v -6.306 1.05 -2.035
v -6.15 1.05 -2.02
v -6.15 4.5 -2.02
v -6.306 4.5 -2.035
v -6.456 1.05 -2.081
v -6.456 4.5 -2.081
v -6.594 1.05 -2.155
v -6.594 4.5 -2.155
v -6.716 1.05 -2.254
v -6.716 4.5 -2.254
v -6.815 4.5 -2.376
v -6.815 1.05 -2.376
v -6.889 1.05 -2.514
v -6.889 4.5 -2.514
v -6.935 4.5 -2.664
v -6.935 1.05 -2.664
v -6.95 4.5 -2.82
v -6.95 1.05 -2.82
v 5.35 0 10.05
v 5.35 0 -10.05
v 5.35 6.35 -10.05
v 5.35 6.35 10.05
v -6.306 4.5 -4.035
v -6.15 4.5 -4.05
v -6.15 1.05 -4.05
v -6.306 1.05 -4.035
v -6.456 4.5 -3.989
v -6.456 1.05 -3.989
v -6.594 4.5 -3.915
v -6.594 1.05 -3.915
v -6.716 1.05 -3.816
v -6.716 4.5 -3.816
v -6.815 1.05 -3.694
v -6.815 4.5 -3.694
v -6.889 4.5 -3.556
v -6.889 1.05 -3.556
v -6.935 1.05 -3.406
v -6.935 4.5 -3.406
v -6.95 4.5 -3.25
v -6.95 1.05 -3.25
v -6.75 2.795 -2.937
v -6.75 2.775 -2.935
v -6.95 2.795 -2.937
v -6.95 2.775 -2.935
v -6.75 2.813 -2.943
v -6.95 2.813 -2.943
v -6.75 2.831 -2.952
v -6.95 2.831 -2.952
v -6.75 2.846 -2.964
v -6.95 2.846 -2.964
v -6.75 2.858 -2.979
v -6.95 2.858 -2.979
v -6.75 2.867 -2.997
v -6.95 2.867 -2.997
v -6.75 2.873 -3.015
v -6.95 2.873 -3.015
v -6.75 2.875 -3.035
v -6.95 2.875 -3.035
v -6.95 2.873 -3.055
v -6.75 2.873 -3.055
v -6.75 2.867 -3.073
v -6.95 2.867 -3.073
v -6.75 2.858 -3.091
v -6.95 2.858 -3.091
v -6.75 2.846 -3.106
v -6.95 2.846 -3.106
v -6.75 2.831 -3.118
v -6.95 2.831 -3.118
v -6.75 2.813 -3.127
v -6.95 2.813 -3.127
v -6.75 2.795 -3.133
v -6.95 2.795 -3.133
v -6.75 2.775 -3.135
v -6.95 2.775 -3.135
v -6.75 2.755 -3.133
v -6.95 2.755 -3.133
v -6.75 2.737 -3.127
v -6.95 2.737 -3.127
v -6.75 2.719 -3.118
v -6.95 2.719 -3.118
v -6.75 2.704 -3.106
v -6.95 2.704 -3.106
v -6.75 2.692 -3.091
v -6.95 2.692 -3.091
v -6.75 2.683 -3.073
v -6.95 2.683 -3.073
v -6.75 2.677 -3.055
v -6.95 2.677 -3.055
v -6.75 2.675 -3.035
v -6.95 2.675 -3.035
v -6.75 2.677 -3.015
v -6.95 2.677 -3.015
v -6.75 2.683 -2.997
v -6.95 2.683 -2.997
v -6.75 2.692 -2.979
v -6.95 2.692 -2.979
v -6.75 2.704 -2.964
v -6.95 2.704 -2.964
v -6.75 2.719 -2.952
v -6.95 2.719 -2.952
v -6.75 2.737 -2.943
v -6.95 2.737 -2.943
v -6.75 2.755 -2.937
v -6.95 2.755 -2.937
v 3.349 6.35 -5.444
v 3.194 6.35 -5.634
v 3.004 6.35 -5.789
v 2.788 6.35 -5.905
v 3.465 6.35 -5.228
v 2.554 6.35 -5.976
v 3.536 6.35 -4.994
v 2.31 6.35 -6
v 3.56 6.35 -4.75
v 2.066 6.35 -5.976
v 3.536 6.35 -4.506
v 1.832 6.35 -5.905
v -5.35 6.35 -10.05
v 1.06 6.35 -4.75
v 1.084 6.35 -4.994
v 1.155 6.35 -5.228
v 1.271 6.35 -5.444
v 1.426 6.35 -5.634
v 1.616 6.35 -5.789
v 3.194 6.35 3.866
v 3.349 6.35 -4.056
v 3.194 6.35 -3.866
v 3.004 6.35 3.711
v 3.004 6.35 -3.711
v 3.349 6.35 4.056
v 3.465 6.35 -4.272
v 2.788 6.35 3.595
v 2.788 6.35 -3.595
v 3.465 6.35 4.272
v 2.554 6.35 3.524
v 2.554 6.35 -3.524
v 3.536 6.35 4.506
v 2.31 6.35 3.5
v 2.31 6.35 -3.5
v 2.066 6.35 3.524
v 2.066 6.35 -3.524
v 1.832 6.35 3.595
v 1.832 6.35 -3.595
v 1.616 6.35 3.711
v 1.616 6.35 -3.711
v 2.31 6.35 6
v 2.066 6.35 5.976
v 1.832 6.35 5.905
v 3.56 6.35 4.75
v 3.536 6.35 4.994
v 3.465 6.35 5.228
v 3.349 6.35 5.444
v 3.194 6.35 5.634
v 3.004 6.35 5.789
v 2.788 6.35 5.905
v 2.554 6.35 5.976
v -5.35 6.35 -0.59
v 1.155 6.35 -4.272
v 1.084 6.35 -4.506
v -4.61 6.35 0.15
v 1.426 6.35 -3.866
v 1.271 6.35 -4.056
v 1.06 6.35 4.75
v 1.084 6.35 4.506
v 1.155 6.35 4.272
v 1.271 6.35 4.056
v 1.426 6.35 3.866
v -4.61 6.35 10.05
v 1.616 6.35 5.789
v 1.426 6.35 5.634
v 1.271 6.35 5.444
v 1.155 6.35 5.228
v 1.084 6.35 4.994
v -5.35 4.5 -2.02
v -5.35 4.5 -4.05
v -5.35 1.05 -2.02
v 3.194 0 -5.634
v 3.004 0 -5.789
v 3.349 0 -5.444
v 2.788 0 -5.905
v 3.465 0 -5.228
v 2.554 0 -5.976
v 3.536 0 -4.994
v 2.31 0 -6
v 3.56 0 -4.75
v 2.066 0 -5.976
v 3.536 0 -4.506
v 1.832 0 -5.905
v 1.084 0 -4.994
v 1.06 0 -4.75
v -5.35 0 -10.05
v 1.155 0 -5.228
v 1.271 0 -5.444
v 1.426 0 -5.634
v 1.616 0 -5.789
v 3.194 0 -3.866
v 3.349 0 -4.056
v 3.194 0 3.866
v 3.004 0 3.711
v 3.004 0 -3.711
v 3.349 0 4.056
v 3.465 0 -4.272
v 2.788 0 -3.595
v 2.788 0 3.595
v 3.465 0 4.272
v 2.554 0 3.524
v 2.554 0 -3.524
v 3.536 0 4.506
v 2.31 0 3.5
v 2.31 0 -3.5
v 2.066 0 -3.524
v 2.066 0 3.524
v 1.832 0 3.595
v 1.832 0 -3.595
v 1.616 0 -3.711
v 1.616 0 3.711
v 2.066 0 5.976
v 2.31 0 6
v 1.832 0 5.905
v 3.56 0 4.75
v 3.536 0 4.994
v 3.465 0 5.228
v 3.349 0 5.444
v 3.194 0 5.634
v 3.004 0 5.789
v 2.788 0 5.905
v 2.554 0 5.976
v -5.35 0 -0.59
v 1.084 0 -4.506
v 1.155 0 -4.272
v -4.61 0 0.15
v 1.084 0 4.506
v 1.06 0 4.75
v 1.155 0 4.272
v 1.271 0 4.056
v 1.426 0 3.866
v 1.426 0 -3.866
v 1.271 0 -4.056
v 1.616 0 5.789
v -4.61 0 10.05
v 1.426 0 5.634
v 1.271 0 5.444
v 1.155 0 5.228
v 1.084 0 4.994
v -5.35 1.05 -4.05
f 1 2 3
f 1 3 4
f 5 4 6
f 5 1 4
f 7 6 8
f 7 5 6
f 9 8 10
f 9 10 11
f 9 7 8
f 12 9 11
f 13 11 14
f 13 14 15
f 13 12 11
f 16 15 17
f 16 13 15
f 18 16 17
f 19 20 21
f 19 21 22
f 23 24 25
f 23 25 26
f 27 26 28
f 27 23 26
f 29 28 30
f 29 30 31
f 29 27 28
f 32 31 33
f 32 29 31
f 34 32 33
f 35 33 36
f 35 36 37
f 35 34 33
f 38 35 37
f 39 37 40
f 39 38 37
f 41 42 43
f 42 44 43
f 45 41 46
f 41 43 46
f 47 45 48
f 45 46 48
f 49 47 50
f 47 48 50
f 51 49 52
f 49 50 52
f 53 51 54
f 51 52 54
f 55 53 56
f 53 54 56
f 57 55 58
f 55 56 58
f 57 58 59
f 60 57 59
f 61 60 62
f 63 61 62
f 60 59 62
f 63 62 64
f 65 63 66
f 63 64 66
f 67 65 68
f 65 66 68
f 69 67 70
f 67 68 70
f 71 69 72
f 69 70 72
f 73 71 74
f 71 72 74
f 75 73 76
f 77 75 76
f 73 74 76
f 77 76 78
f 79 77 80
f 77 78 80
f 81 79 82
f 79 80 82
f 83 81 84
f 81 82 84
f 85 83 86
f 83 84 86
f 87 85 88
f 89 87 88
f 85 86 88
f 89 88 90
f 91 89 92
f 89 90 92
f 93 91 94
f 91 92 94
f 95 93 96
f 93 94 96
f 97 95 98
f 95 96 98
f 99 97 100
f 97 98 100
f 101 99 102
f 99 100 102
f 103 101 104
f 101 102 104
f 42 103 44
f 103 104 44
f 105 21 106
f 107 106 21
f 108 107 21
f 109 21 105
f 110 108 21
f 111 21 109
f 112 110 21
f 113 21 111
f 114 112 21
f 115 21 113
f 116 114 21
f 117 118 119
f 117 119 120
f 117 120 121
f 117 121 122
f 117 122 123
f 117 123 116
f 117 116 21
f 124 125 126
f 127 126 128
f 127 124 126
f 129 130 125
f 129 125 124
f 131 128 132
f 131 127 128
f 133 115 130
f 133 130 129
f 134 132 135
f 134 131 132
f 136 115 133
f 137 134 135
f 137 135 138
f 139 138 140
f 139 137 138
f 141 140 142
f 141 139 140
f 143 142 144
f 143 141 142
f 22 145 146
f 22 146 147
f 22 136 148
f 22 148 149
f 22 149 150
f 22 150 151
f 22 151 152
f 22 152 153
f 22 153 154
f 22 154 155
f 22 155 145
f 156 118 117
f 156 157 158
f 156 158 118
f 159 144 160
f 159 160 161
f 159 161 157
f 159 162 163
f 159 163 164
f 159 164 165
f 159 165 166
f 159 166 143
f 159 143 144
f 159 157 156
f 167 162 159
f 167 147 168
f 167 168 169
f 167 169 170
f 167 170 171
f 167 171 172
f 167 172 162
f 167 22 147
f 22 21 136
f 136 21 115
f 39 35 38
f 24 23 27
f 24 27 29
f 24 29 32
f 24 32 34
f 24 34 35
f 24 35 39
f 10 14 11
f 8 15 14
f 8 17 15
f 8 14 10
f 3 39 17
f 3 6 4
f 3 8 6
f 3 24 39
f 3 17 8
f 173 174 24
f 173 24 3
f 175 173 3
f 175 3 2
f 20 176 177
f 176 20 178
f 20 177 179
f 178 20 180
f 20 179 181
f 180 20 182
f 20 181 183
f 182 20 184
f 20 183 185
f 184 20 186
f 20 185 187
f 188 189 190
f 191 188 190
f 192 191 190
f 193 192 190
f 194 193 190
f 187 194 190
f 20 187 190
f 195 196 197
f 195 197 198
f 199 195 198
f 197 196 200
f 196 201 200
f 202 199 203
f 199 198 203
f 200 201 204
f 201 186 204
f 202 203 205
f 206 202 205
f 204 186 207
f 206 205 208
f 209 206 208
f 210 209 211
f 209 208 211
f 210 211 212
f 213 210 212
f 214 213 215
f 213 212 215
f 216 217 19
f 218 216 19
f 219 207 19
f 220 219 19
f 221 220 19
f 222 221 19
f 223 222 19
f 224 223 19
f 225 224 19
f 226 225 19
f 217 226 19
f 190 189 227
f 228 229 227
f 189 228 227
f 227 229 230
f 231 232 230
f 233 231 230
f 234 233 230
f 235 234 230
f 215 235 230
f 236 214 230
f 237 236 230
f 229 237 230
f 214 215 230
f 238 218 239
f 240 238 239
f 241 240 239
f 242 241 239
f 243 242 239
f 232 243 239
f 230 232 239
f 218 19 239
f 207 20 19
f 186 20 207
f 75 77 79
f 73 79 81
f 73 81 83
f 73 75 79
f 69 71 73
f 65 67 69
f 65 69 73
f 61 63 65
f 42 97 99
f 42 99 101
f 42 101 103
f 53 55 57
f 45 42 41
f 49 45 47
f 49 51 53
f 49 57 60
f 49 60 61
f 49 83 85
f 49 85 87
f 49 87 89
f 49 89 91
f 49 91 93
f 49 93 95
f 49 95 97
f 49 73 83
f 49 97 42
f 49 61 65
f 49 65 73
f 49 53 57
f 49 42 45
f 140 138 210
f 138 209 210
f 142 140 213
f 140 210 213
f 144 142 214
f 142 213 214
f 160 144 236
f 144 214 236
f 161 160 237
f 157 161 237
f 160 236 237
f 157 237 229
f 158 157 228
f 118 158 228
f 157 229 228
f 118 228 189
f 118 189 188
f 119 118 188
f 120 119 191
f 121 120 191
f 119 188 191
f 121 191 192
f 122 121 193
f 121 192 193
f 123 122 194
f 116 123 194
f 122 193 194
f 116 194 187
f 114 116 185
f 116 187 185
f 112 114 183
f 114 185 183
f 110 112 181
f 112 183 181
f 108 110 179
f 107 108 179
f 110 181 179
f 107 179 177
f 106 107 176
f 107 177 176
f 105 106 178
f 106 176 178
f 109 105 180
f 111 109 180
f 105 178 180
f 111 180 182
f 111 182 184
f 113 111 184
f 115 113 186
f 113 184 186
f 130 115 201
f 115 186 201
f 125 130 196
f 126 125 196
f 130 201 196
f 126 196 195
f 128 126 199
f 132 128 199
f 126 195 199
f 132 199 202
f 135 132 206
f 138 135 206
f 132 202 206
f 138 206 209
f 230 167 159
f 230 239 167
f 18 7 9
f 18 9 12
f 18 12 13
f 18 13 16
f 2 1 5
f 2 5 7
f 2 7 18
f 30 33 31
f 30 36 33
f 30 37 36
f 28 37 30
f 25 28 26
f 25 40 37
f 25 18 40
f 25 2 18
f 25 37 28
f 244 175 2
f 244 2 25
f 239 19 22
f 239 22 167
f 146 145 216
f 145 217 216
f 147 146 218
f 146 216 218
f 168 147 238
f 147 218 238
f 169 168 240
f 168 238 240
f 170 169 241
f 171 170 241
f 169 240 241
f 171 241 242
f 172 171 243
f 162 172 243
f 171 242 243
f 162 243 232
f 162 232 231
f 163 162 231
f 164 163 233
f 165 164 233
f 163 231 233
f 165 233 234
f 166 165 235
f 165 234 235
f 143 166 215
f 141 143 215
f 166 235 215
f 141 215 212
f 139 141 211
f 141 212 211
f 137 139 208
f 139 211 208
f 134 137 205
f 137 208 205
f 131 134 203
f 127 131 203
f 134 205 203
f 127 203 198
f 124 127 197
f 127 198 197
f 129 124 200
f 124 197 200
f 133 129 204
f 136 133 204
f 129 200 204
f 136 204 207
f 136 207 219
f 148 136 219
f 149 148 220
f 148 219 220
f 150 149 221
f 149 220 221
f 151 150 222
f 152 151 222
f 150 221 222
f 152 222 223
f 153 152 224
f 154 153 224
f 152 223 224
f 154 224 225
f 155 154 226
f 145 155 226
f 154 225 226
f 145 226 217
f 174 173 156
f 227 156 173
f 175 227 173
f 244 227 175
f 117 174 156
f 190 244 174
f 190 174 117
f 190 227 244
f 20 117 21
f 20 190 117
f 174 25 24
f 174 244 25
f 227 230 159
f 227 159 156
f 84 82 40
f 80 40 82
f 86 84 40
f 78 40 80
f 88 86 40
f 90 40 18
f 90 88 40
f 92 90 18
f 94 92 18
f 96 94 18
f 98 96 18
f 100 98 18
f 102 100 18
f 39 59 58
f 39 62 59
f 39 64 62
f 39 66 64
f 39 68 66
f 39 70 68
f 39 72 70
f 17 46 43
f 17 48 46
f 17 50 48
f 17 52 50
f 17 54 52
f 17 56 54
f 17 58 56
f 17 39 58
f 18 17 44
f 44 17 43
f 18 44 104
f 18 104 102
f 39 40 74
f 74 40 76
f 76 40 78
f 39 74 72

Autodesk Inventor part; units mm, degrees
ref_plane "YZ Plane" through (0, 0, 0) normal (1, 0, 0) x (0, 1, 0)
ref_plane "XZ Plane" through (0, 0, 0) normal (0, 1, 0) x (-1, 0, 0)
ref_plane "XY Plane" through (0, 0, 0) normal (0, 0, 1) x (1, 0, 0)
sketch "Skizze1" plane through (0, 0, 0) normal (0, 1, 0) x (-1, 0, 0)
  line L0 (-5.35, 10.05) -> (5.35, 10.05)
  line L1 (5.35, 10.05) -> (5.35, -10.05)
  line L2 (5.35, -10.05) -> (-5.35, -10.05)
  line L3 (-5.35, -10.05) -> (-5.35, 10.05)
  line L4 (-5.35, 10.05) -> (5.35, -10.05) construction
  line L5 (5.35, 10.05) -> (-5.35, -10.05) construction
  line L6 (4.61, 10.05) -> (4.61, 0.15)
  line L7 (4.61, 0.15) -> (5.35, -0.59)
  point P0 (0, 0)
  dimension "d0" = 10.7
  dimension "d1" = 20.1
  dimension "d2" = 9.96
  dimension "d3" = 9.9
  dimension "d4" = 45
extrude "Extrusion1" add sketch "Skizze1" along normal blind 6.35 contours L0 L6 L7 L1 L2 L3
sketch "Skizze2" plane through (-5.35, 0, -10.05) normal (-1, 0, 0) x (0, 0, 1)
  line L0 (6, 4.5) -> (8.03, 4.5)
  line L1 (8.03, 4.5) -> (8.03, 1.05)
  line L2 (8.03, 1.05) -> (6, 1.05)
  line L3 (6, 1.05) -> (6, 4.5)
  line L4 (0, 0) -> (9.46, 0) projected
  line L5 (0, 6.35) -> (9.46, 6.35) projected
  line L6 (0, 0) -> (0, 6.35) projected
  point P0 (10.05, 0)
  dimension "d7" = 2.03
  dimension "d8" = 3.45
  dimension "d9" = 1.05
  dimension "d10" = 1.85
  dimension "d11" = 6
extrude "Extrusion2" add sketch "Skizze2" along normal blind 1.6
fillet "Rundung1" radius 0.8 2 edges at (-6.95, 2.775, -2.02) (-6.95, 2.775, -4.05)
sketch "Skizze3" plane through (0, 6.35, 0) normal (0, 1, 0) x (1, 0, 0)
  line L0 (-4.61, -0.15) -> (-4.61, -10.05) projected
  line L1 (5.35, -10.05) -> (5.35, 10.05) projected
  line L2 (5.35, 10.05) -> (-5.35, 10.05) projected
  line L3 (-4.61, -10.05) -> (5.35, -10.05) projected
  point P0 (0, 0)
  point P1 (2.31, -4.75)
  point P2 (2.31, 4.75)
  dimension "d15" = 9.5
  dimension "d16" = 6.92
  dimension "d17" = 3.04
  dimension "d18" = 0
  dimension "d19" = 5.3
  dimension "d20" = 5.3
hole "Bohrung1" at (2.31, 6.35, 4.75) at (2.31, 6.35, -4.75) direction (0, -1, 0) diameter 2.5 end through all
sketch "Skizze4" plane through (-6.95, 0, -10.05) normal (-1, 0, 0) x (0, 0, 1)
  line L0 (6.8, 1.05) -> (6.8, 4.5) projected
  line L1 (6.8, 1.05) -> (7.23, 1.05) projected
  line L2 (7.23, 4.5) -> (7.23, 1.05) projected
  line L3 (7.23, 4.5) -> (6.8, 4.5) projected
  circle A0 centre (7.015, 2.775) radius 0.1
  point P0 (10.05, 0)
  dimension "d28" = 0.2
  dimension "d29" = 1.725
  dimension "d30" = 1.725
  dimension "d31" = 0.43
  dimension "d32" = 0.215
extrude "Extrusion3" cut sketch "Skizze4" against normal blind 0.2 contours A0
equation "\"d19\" = d20"
equation "\"d32\" = 0.5 * d31"
properties part number "MicroswitchBig"
